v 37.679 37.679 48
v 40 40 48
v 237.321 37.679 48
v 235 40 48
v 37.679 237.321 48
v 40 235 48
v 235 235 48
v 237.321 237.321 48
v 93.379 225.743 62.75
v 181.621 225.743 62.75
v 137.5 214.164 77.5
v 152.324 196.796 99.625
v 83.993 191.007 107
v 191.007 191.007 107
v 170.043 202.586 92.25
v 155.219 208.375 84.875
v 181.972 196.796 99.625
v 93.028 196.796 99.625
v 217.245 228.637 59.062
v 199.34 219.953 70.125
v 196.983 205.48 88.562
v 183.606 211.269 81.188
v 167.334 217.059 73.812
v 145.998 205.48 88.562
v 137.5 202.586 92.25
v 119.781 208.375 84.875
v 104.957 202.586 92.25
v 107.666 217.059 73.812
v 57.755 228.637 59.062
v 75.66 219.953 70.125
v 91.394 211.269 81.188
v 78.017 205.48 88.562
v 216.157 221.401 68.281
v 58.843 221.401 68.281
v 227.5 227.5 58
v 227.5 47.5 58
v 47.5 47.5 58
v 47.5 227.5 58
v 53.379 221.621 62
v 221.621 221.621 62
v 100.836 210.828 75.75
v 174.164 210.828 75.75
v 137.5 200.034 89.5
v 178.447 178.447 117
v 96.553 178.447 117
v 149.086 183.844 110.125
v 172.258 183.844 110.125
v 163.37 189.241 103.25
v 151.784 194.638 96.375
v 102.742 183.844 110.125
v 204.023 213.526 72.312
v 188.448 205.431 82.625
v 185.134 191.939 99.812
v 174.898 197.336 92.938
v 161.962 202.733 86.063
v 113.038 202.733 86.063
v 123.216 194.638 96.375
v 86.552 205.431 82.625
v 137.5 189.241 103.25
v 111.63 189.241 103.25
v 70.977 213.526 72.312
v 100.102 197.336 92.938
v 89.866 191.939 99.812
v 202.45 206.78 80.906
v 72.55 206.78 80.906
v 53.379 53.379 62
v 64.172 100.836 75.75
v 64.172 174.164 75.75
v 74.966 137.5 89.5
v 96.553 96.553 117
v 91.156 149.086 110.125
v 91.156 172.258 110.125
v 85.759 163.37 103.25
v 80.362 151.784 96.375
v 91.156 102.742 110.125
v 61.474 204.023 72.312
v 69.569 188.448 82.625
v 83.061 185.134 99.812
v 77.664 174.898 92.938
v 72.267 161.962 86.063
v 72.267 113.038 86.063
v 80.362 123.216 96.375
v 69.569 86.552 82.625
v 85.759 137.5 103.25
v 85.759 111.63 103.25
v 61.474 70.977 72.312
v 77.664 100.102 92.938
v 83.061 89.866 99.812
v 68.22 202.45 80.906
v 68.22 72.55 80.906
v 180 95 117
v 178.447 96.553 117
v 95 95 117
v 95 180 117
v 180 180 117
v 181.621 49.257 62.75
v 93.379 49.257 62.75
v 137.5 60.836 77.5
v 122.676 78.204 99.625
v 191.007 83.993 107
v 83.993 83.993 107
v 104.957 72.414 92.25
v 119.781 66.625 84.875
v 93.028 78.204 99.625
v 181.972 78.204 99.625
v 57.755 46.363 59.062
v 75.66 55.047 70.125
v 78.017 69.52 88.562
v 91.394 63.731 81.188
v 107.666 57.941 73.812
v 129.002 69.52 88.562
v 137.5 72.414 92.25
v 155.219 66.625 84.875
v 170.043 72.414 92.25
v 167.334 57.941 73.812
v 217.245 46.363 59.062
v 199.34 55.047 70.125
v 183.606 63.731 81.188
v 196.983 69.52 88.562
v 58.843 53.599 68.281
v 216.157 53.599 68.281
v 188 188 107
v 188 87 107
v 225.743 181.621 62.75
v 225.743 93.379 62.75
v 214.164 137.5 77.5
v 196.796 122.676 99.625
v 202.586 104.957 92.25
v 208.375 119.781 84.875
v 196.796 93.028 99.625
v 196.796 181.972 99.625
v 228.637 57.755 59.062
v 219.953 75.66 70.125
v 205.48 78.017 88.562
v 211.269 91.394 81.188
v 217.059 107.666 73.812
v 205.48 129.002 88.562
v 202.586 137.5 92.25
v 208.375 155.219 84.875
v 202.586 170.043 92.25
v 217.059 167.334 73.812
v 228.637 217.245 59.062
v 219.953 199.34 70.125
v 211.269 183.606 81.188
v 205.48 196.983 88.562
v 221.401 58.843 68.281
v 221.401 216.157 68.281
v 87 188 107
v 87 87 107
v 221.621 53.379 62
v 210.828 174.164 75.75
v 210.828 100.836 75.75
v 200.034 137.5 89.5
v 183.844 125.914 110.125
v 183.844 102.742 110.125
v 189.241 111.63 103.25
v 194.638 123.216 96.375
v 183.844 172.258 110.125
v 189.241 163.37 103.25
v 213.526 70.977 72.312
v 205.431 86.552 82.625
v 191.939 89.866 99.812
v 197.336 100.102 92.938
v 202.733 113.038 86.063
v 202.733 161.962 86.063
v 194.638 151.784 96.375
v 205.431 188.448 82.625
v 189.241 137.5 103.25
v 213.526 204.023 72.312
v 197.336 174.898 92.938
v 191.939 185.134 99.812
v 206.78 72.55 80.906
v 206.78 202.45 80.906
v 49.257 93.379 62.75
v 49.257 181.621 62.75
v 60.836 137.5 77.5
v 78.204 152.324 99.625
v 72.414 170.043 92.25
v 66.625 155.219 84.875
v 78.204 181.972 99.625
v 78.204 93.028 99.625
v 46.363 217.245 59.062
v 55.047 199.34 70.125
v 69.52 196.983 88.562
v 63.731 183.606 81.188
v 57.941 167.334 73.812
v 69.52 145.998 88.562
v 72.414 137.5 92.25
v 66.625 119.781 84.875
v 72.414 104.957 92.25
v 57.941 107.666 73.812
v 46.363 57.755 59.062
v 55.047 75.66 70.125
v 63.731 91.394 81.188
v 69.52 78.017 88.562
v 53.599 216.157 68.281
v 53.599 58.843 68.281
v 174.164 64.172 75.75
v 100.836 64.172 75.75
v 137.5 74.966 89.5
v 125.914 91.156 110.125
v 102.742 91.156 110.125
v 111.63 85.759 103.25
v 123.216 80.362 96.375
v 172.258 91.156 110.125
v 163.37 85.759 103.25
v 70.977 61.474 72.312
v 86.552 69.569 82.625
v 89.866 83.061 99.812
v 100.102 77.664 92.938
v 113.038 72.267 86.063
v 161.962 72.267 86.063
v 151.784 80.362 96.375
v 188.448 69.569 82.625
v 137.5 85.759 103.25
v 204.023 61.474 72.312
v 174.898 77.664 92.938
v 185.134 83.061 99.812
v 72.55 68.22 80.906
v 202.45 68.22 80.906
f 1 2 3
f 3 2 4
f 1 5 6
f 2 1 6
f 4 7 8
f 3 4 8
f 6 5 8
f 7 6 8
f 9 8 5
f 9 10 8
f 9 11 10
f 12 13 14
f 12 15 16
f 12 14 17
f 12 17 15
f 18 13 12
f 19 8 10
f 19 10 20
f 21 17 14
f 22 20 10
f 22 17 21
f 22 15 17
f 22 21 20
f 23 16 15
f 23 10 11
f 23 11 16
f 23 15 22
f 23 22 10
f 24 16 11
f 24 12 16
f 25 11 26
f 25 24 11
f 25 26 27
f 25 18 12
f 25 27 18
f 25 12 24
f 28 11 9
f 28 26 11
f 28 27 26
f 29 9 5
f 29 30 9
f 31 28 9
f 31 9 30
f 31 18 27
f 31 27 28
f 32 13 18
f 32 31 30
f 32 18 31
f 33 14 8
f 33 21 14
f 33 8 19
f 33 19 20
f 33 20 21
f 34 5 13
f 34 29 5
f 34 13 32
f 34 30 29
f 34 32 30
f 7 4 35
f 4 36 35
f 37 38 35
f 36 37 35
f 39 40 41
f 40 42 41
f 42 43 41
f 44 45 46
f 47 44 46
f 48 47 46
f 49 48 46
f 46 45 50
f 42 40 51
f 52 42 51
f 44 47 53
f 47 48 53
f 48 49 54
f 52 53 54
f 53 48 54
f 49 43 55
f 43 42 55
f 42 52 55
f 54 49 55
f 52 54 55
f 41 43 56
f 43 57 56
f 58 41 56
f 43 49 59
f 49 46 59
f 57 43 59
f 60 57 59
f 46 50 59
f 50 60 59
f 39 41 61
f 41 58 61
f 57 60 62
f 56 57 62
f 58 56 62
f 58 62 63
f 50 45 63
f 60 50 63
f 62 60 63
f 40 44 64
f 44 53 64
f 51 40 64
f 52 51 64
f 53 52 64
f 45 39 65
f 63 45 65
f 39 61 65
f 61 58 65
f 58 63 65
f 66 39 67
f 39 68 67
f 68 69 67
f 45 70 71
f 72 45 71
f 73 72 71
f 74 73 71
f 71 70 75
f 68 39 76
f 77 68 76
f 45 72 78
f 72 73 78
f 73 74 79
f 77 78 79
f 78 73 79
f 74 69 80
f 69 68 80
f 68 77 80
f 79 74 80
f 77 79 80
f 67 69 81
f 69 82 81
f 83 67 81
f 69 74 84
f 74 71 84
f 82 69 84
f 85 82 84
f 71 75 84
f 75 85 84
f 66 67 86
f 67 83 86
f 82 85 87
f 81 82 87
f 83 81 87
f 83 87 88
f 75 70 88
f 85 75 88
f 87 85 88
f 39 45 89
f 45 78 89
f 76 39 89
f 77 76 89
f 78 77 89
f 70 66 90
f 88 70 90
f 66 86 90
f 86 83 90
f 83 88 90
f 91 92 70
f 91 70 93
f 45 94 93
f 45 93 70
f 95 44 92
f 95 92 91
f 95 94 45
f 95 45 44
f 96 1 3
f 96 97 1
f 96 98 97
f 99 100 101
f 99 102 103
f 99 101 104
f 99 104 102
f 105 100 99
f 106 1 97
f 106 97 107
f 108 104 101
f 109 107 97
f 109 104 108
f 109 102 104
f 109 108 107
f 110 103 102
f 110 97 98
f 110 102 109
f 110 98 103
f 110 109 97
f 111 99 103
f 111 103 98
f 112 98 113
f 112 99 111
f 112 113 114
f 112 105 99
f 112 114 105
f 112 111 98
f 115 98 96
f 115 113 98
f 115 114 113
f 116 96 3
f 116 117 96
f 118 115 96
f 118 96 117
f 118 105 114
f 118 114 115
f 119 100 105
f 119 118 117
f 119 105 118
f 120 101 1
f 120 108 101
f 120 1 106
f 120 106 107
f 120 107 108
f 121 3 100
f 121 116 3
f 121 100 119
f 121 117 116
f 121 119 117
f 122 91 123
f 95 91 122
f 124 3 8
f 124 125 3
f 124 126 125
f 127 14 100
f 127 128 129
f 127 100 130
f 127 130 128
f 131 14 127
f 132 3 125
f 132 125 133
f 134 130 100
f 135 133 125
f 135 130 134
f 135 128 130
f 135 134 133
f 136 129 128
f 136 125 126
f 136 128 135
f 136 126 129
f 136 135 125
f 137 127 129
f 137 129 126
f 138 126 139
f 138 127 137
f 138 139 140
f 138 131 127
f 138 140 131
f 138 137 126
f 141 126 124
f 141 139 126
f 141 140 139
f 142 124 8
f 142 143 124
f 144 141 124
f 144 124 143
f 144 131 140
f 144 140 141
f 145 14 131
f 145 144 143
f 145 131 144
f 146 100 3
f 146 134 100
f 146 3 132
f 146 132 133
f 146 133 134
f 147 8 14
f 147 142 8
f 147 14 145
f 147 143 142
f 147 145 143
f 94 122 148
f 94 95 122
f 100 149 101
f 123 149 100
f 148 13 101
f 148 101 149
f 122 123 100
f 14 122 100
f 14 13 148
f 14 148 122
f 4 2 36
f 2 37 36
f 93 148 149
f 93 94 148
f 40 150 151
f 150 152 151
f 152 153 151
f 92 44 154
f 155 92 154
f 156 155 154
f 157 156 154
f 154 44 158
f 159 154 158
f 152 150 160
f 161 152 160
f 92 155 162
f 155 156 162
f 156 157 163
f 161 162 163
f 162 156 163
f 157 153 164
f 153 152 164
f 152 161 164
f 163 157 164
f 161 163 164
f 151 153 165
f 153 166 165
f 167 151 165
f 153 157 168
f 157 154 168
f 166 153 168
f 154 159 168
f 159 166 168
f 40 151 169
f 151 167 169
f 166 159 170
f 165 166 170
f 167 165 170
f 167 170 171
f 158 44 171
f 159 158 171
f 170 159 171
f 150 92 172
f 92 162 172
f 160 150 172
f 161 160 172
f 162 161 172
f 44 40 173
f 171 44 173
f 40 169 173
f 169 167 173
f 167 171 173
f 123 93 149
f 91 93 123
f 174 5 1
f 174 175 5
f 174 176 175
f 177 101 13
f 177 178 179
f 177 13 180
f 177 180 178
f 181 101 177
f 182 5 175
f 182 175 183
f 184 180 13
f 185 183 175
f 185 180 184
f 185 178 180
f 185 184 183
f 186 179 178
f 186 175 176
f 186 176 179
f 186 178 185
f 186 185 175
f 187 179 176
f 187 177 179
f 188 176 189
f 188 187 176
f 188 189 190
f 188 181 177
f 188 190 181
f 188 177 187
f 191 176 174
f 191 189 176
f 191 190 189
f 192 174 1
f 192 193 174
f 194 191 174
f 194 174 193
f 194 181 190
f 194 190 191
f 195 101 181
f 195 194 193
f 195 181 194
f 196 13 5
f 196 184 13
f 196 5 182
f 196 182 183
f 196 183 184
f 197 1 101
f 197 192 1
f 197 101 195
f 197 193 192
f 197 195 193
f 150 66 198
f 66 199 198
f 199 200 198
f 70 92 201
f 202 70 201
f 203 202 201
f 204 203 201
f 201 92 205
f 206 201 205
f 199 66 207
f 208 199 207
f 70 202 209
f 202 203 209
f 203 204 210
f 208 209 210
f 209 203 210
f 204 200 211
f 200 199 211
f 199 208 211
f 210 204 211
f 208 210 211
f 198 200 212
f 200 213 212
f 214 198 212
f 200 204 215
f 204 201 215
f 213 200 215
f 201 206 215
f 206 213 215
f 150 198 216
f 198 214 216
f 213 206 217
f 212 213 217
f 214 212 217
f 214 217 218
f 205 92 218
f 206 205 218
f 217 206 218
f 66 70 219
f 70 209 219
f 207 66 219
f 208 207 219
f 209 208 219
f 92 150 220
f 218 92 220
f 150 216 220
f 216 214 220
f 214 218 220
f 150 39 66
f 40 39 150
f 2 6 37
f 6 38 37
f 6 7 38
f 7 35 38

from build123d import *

# Parameters (mm, degrees)
BOX009_W     = 275
BOX009_H     = 275
BOX009_DEPTH = 59
SKETCH036_W  = 101
SKETCH036_H  = 101
SKETCH037_W  = 85
SKETCH037_H  = 85
BOX008_W     = 275
BOX008_H     = 275
BOX008_DEPTH = 52
SKETCH034_W  = 275
SKETCH034_H  = 275
SKETCH035_W  = 0.1
SKETCH035_H  = 0.1
BOX007_W     = 275
BOX007_H     = 275
BOX007_DEPTH = 47
SKETCH032_W  = 195
SKETCH032_H  = 195
SKETCH033_W  = 180
SKETCH033_H  = 180
BOX006_W     = 275
BOX006_H     = 275
BOX006_DEPTH = 52
SKETCH030_W  = 275
SKETCH030_H  = 275
SKETCH031_W  = 0.1
SKETCH031_H  = 0.1
SKETCH028_W  = 275
SKETCH028_H  = 275
SKETCH029_W  = 0.1
SKETCH029_H  = 0.1
BOX005_W     = 275
BOX005_H     = 275
BOX005_DEPTH = 57
BOX004_W     = 275
BOX004_H     = 275
BOX004_DEPTH = 55
SKETCH026_W  = 275
SKETCH026_H  = 275
SKETCH027_W  = 0.1
SKETCH027_H  = 0.1
SKETCH024_W  = 275
SKETCH024_H  = 275
SKETCH025_W  = 0.1
SKETCH025_H  = 0.1
BOX003_W     = 275
BOX003_H     = 275
BOX003_DEPTH = 70


with BuildPart() as layer0keep004:
    # Box009 → Box009 (new body)
    with BuildSketch(Plane.XY.offset(48)):
        with Locations((137.5, 137.5)):
            Rectangle(BOX009_W, BOX009_H)
    extrude(amount=BOX009_DEPTH)


with BuildPart() as layeronekeep:
    # Sketch036 → Loft010 section 0
    with BuildSketch(Plane.XY.offset(107)):
        with Locations((137.5, 137.5)):
            Rectangle(SKETCH036_W, SKETCH036_H)
    # Sketch037 → Loft010 section 1
    with BuildSketch(Plane.XY.offset(117)):
        with Locations((137.5, 137.5)):
            Rectangle(SKETCH037_W, SKETCH037_H)
    loft()

    # Fusion018: union layer0Keep004
    add(layer0keep004.part)


with BuildPart() as layer013:
    # Box008 → Box008 (new body)
    with BuildSketch(Plane.XY.offset(5)):
        with Locations((137.5, 137.5)):
            Rectangle(BOX008_W, BOX008_H)
    extrude(amount=BOX008_DEPTH)


with BuildPart() as layeronecut003:
    # Sketch034 → Loft009 section 0
    with BuildSketch(Plane.XY):
        with Locations((137.5, 137.5)):
            Rectangle(SKETCH034_W, SKETCH034_H)
    # Sketch035 → Loft009 section 1
    with BuildSketch(Plane.XY.offset(175.1)):
        with Locations((137.5, 137.5)):
            Rectangle(SKETCH035_W, SKETCH035_H)
    loft()


with BuildPart() as layeronecut003_1:
    # Loft009 placement: moved
    add(layeronecut003.part.moved(Location((0, 0, -6))))

    # Common008: intersect layer013
    add(layer013.part, mode=Mode.INTERSECT)


with BuildPart() as layer0keep002:
    # Box007 → Box007 (new body)
    with BuildSketch(Plane.XY):
        with Locations((137.5, 137.5)):
            Rectangle(BOX007_W, BOX007_H)
    extrude(amount=BOX007_DEPTH)


with BuildPart() as layer012:
    # Sketch032 → Loft008 section 0
    with BuildSketch(Plane.XY.offset(47)):
        with Locations((137.5, 137.5)):
            Rectangle(SKETCH032_W, SKETCH032_H)
    # Sketch033 → Loft008 section 1
    with BuildSketch(Plane.XY.offset(57)):
        with Locations((137.5, 137.5)):
            Rectangle(SKETCH033_W, SKETCH033_H)
    loft()

    # Fusion016: union layer0Keep002
    add(layer0keep002.part)


with BuildPart() as layer009:
    # Box006 → Box006 (new body)
    with BuildSketch(Plane.XY.offset(5)):
        with Locations((137.5, 137.5)):
            Rectangle(BOX006_W, BOX006_H)
    extrude(amount=BOX006_DEPTH)


with BuildPart() as layer0cut002:
    # Sketch030 → Loft007 section 0
    with BuildSketch(Plane.XY):
        with Locations((137.5, 137.5)):
            Rectangle(SKETCH030_W, SKETCH030_H)
    # Sketch031 → Loft007 section 1
    with BuildSketch(Plane.XY.offset(175.1)):
        with Locations((137.5, 137.5)):
            Rectangle(SKETCH031_W, SKETCH031_H)
    loft()


with BuildPart() as layer0cut002_1:
    # Loft007 placement: moved
    add(layer0cut002.part.moved(Location((0, 0, -6))))

    # Common006: intersect layer009
    add(layer009.part, mode=Mode.INTERSECT)


with BuildPart() as outerlayer005:
    # Sketch028 → Loft006 section 0
    with BuildSketch(Plane.XY):
        with Locations((137.5, 137.5)):
            Rectangle(SKETCH028_W, SKETCH028_H)
    # Sketch029 → Loft006 section 1
    with BuildSketch(Plane.XY.offset(175.1)):
        with Locations((137.5, 137.5)):
            Rectangle(SKETCH029_W, SKETCH029_H)
    loft()


with BuildPart() as layeronecutter001:
    # Box005 → Box005 (new body)
    with BuildSketch(Plane.XY):
        with Locations((137.5, 137.5)):
            Rectangle(BOX005_W, BOX005_H)
    extrude(amount=BOX005_DEPTH)

    # Common005: intersect outerLayer005
    add(outerlayer005.part, mode=Mode.INTERSECT)

    # Cut002: cut layer0cut002
    add(layer0cut002_1.part, mode=Mode.SUBTRACT)

    # Common007: intersect layer012
    add(layer012.part, mode=Mode.INTERSECT)

    # Fusion017: union layerOnecut003
    add(layeronecut003_1.part)


with BuildPart() as layeronecutter001_1:
    # Fusion017 placement: moved
    add(layeronecutter001.part.moved(Location((0, 0, 1))))


with BuildPart() as layer005:
    # Box004 → Box004 (new body)
    with BuildSketch(Plane.XY.offset(62)):
        with Locations((137.5, 137.5)):
            Rectangle(BOX004_W, BOX004_H)
    extrude(amount=BOX004_DEPTH)


with BuildPart() as layer0cut001:
    # Sketch026 → Loft005 section 0
    with BuildSketch(Plane.XY):
        with Locations((137.5, 137.5)):
            Rectangle(SKETCH026_W, SKETCH026_H)
    # Sketch027 → Loft005 section 1
    with BuildSketch(Plane.XY.offset(175.1)):
        with Locations((137.5, 137.5)):
            Rectangle(SKETCH027_W, SKETCH027_H)
    loft()


with BuildPart() as layer0cut001_1:
    # Loft005 placement: moved
    add(layer0cut001.part.moved(Location((0, 0, -6))))

    # Common004: intersect layer005
    add(layer005.part, mode=Mode.INTERSECT)


with BuildPart() as outerlayer003:
    # Sketch024 → Loft004 section 0
    with BuildSketch(Plane.XY):
        with Locations((137.5, 137.5)):
            Rectangle(SKETCH024_W, SKETCH024_H)
    # Sketch025 → Loft004 section 1
    with BuildSketch(Plane.XY.offset(175.1)):
        with Locations((137.5, 137.5)):
            Rectangle(SKETCH025_W, SKETCH025_H)
    loft()


with BuildPart() as layerone002:
    # Box003 → Box003 (new body)
    with BuildSketch(Plane.XY.offset(47)):
        with Locations((137.5, 137.5)):
            Rectangle(BOX003_W, BOX003_H)
    extrude(amount=BOX003_DEPTH)

    # Common003: intersect outerLayer003
    add(outerlayer003.part, mode=Mode.INTERSECT)

    # Cut001: cut layer0cut001
    add(layer0cut001_1.part, mode=Mode.SUBTRACT)

    # Cut003: cut layerOneCutter001
    add(layeronecutter001_1.part, mode=Mode.SUBTRACT)

    # Common009: intersect layerOneKeep
    add(layeronekeep.part, mode=Mode.INTERSECT)


solid = layerone002.part
